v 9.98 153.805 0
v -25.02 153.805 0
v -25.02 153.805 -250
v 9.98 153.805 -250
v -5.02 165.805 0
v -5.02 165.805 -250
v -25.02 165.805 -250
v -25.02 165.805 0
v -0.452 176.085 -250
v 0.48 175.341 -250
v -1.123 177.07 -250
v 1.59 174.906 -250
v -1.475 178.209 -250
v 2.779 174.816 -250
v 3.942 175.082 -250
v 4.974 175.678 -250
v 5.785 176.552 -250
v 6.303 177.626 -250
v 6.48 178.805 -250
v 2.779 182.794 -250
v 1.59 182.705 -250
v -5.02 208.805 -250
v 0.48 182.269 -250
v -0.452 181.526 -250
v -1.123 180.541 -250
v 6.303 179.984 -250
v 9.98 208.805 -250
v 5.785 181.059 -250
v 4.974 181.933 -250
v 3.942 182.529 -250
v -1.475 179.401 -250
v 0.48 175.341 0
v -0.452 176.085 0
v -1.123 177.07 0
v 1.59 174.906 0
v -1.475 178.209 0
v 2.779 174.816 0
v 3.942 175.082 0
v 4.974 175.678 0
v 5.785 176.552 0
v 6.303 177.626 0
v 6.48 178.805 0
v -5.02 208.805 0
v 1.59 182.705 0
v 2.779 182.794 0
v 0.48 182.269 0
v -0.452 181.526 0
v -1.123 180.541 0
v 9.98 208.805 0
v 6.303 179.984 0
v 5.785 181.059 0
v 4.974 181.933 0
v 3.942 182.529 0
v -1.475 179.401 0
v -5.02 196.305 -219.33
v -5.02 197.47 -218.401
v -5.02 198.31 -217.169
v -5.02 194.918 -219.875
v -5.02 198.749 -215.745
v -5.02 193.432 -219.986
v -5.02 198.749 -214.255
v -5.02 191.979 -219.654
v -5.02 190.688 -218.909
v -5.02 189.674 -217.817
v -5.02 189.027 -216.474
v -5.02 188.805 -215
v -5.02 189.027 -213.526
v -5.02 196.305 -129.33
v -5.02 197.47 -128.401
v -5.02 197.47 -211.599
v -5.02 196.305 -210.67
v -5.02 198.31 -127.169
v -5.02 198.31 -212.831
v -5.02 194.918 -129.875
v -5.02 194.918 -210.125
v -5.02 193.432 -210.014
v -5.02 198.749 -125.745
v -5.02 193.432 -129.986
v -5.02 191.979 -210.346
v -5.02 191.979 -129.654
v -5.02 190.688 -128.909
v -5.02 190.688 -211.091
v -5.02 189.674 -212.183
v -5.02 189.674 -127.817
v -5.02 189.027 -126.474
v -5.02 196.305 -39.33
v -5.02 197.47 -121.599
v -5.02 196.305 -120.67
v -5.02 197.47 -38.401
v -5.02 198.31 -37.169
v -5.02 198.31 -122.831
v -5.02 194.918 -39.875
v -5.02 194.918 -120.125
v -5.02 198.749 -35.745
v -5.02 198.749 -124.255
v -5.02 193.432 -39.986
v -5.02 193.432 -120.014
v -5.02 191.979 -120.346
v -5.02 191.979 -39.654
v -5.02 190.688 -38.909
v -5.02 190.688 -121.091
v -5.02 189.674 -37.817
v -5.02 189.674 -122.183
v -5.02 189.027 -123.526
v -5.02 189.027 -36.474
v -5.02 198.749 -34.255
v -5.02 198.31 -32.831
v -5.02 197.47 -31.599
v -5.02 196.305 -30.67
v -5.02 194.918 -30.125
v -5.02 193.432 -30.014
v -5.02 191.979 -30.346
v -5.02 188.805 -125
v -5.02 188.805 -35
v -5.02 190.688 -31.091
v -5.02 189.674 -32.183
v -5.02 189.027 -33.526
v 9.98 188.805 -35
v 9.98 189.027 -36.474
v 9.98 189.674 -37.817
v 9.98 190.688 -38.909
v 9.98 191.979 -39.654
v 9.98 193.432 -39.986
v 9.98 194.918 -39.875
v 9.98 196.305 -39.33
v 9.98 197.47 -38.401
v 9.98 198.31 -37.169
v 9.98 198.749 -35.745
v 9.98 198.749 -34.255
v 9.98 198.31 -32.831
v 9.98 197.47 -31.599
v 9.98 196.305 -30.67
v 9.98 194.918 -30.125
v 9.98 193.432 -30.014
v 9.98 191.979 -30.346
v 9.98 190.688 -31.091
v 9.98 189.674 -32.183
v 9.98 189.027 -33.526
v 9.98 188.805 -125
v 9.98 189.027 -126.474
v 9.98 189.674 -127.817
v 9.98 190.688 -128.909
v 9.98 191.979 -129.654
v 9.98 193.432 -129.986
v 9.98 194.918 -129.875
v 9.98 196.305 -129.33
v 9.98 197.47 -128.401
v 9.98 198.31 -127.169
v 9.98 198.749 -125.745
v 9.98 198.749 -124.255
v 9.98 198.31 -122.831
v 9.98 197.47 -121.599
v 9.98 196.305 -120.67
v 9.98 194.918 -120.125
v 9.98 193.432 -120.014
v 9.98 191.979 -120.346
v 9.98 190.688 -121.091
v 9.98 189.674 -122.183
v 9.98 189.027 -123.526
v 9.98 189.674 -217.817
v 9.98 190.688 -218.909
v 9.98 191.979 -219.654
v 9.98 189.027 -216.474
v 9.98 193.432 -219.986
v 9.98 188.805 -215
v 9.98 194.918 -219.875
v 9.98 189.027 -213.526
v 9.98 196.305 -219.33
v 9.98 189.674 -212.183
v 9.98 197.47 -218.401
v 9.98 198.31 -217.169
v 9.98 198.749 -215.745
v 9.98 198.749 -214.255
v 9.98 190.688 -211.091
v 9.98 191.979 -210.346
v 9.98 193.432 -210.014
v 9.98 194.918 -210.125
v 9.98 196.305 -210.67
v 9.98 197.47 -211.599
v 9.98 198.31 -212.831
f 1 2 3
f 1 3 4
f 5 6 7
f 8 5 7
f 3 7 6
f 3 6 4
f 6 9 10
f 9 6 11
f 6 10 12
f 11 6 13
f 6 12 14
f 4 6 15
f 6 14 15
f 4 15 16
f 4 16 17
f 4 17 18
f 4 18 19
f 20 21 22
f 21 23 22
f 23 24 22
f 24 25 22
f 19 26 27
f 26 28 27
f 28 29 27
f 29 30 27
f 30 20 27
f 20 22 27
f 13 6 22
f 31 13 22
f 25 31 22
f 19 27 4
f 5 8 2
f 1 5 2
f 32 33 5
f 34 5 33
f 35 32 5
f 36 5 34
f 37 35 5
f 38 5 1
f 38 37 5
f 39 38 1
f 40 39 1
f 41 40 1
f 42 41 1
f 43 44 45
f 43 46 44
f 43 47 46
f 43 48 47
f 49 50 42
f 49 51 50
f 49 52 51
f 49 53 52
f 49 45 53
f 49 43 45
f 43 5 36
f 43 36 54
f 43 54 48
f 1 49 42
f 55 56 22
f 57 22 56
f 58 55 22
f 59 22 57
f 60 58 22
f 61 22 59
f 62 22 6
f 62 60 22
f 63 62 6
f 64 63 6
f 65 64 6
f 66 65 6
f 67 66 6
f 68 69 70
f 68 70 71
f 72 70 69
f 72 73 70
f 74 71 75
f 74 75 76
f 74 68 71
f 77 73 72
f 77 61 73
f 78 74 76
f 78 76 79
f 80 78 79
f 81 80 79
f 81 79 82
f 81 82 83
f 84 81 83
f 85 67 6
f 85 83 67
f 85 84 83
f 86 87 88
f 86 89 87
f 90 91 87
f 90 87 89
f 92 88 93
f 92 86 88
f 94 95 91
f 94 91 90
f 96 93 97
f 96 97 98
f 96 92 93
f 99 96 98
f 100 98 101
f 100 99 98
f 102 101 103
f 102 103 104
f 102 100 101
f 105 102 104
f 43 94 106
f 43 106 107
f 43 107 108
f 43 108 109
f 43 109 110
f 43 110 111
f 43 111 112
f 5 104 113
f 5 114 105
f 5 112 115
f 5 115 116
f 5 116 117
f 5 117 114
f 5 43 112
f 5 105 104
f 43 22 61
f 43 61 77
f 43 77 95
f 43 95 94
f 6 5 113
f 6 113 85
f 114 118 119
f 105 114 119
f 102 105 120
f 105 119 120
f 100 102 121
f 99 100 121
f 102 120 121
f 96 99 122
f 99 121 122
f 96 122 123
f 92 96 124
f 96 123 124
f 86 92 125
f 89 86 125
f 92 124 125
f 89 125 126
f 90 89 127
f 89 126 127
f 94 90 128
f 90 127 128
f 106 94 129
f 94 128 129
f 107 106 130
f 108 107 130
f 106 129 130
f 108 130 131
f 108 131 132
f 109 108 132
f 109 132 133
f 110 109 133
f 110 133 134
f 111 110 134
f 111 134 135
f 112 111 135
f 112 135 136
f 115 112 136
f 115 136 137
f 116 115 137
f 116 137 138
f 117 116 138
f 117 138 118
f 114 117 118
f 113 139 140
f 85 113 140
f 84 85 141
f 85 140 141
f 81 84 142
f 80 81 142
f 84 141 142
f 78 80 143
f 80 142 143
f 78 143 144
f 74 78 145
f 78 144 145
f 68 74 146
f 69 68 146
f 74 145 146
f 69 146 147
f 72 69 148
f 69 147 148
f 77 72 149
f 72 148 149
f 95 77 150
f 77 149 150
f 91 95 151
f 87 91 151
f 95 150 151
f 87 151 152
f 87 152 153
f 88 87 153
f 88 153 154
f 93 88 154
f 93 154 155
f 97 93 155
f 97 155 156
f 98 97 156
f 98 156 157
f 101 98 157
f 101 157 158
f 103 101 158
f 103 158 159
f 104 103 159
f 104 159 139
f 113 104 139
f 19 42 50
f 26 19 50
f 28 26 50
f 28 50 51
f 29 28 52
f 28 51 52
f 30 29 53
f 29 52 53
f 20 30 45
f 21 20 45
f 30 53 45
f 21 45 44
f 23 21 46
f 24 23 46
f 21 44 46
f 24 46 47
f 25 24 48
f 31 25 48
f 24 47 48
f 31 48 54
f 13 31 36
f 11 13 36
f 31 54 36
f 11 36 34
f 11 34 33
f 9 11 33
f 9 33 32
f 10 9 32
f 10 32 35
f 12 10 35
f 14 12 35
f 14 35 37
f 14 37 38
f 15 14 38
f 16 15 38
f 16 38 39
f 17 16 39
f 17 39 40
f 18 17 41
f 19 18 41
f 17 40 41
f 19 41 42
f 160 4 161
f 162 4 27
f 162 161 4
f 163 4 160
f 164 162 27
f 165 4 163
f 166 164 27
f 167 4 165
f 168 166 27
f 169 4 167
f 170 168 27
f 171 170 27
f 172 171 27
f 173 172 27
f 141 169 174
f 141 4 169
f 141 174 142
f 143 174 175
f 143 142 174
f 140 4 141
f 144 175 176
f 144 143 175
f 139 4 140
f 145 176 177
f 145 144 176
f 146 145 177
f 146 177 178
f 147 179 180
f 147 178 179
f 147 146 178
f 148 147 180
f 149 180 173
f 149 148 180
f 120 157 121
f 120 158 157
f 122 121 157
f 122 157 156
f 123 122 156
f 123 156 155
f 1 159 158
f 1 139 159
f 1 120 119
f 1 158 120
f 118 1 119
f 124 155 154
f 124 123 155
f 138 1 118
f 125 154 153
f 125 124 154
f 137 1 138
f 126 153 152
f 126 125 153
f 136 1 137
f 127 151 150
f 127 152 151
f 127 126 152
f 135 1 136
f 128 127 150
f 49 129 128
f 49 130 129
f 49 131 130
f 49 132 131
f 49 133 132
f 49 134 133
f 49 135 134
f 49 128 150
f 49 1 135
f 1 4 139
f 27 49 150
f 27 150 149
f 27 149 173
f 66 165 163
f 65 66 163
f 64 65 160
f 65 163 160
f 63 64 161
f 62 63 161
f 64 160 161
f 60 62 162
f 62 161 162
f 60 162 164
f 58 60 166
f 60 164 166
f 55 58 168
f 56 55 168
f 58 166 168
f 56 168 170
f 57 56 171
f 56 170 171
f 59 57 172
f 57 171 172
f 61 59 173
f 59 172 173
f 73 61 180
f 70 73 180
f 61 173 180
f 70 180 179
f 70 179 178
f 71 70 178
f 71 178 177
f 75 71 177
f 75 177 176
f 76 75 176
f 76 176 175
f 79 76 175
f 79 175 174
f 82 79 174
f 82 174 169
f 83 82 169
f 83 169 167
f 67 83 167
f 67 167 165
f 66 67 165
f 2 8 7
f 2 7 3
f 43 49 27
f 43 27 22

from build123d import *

# Parameters (mm, degrees)
SKETCH_1_R                      = 4
EXTRUDE_1_DEPTH                 = 250
CUT_EXTRUDE_1_REACH             = 329.604
SKETCH_2_R                      = 5
CUT_EXTRUDE_1_DIRECTION_2_DEPTH = 328.604367435


with BuildPart() as part:
    # 草圖1 → 填料-伸長1 (new body)
    with BuildSketch(Plane.XY):
        Polygon((-5.019605957, 208.805223982), (-5.019605957, 165.805223982), (-25.019605957, 165.805223982), (-25.019605957, 153.805223982), (9.980394043, 153.805223982), (9.980394043, 208.805223982), align=None)
        with Locations((2.480394043, 178.805223982)):
            Circle(SKETCH_1_R, mode=Mode.SUBTRACT)
    extrude(amount=-EXTRUDE_1_DEPTH)

    # 草圖2 → 除料-伸長1 (cut, up to next)
    with BuildSketch(Plane(origin=(9.980394043, 0, 0), x_dir=(0, 0, -1), z_dir=(1, 0, 0)), mode=Mode.PRIVATE) as cut_extrude_1_sk1:
        with Locations(Location((35, 193.805223982, 0), (0, 0, 270))):
            Circle(SKETCH_2_R)
    cut_extrude_1_tool1 = extrude(cut_extrude_1_sk1.sketch, amount=-CUT_EXTRUDE_1_REACH, mode=Mode.PRIVATE) & part.part
    # 草圖2 → 除料-伸長1 (cut, up to next)
    with BuildSketch(Plane(origin=(9.980394043, 0, 0), x_dir=(0, 0, -1), z_dir=(1, 0, 0)), mode=Mode.PRIVATE) as cut_extrude_1_sk2:
        with Locations(Location((125, 193.805223982, 0), (0, 0, 270))):
            Circle(SKETCH_2_R)
    cut_extrude_1_tool2 = extrude(cut_extrude_1_sk2.sketch, amount=-CUT_EXTRUDE_1_REACH, mode=Mode.PRIVATE) & part.part
    # 草圖2 → 除料-伸長1 (cut, up to next)
    with BuildSketch(Plane(origin=(9.980394043, 0, 0), x_dir=(0, 0, -1), z_dir=(1, 0, 0)), mode=Mode.PRIVATE) as cut_extrude_1_sk3:
        with Locations(Location((215, 193.805223982, 0), (0, 0, 270))):
            Circle(SKETCH_2_R)
    cut_extrude_1_tool3 = extrude(cut_extrude_1_sk3.sketch, amount=-CUT_EXTRUDE_1_REACH, mode=Mode.PRIVATE) & part.part
    add(cut_extrude_1_tool1.solids().sort_by_distance((9.980394, 193.805224, -35))[0], mode=Mode.SUBTRACT)
    add(cut_extrude_1_tool2.solids().sort_by_distance((9.980394, 193.805224, -125))[0], mode=Mode.SUBTRACT)
    add(cut_extrude_1_tool3.solids().sort_by_distance((9.980394, 193.805224, -215))[0], mode=Mode.SUBTRACT)

    # 草圖2 → 除料-伸長1 direction 2 (cut)
    with BuildSketch(Plane(origin=(9.980394043, 0, 0), x_dir=(0, 0, -1), z_dir=(1, 0, 0))):
        with Locations(Location((35, 193.805223982, 0), (0, 0, 270))):
            Circle(SKETCH_2_R)
        with Locations(Location((125, 193.805223982, 0), (0, 0, 270))):
            Circle(SKETCH_2_R)
        with Locations(Location((215, 193.805223982, 0), (0, 0, 270))):
            Circle(SKETCH_2_R)
    extrude(amount=CUT_EXTRUDE_1_DIRECTION_2_DEPTH, mode=Mode.SUBTRACT)


solid = part.part
